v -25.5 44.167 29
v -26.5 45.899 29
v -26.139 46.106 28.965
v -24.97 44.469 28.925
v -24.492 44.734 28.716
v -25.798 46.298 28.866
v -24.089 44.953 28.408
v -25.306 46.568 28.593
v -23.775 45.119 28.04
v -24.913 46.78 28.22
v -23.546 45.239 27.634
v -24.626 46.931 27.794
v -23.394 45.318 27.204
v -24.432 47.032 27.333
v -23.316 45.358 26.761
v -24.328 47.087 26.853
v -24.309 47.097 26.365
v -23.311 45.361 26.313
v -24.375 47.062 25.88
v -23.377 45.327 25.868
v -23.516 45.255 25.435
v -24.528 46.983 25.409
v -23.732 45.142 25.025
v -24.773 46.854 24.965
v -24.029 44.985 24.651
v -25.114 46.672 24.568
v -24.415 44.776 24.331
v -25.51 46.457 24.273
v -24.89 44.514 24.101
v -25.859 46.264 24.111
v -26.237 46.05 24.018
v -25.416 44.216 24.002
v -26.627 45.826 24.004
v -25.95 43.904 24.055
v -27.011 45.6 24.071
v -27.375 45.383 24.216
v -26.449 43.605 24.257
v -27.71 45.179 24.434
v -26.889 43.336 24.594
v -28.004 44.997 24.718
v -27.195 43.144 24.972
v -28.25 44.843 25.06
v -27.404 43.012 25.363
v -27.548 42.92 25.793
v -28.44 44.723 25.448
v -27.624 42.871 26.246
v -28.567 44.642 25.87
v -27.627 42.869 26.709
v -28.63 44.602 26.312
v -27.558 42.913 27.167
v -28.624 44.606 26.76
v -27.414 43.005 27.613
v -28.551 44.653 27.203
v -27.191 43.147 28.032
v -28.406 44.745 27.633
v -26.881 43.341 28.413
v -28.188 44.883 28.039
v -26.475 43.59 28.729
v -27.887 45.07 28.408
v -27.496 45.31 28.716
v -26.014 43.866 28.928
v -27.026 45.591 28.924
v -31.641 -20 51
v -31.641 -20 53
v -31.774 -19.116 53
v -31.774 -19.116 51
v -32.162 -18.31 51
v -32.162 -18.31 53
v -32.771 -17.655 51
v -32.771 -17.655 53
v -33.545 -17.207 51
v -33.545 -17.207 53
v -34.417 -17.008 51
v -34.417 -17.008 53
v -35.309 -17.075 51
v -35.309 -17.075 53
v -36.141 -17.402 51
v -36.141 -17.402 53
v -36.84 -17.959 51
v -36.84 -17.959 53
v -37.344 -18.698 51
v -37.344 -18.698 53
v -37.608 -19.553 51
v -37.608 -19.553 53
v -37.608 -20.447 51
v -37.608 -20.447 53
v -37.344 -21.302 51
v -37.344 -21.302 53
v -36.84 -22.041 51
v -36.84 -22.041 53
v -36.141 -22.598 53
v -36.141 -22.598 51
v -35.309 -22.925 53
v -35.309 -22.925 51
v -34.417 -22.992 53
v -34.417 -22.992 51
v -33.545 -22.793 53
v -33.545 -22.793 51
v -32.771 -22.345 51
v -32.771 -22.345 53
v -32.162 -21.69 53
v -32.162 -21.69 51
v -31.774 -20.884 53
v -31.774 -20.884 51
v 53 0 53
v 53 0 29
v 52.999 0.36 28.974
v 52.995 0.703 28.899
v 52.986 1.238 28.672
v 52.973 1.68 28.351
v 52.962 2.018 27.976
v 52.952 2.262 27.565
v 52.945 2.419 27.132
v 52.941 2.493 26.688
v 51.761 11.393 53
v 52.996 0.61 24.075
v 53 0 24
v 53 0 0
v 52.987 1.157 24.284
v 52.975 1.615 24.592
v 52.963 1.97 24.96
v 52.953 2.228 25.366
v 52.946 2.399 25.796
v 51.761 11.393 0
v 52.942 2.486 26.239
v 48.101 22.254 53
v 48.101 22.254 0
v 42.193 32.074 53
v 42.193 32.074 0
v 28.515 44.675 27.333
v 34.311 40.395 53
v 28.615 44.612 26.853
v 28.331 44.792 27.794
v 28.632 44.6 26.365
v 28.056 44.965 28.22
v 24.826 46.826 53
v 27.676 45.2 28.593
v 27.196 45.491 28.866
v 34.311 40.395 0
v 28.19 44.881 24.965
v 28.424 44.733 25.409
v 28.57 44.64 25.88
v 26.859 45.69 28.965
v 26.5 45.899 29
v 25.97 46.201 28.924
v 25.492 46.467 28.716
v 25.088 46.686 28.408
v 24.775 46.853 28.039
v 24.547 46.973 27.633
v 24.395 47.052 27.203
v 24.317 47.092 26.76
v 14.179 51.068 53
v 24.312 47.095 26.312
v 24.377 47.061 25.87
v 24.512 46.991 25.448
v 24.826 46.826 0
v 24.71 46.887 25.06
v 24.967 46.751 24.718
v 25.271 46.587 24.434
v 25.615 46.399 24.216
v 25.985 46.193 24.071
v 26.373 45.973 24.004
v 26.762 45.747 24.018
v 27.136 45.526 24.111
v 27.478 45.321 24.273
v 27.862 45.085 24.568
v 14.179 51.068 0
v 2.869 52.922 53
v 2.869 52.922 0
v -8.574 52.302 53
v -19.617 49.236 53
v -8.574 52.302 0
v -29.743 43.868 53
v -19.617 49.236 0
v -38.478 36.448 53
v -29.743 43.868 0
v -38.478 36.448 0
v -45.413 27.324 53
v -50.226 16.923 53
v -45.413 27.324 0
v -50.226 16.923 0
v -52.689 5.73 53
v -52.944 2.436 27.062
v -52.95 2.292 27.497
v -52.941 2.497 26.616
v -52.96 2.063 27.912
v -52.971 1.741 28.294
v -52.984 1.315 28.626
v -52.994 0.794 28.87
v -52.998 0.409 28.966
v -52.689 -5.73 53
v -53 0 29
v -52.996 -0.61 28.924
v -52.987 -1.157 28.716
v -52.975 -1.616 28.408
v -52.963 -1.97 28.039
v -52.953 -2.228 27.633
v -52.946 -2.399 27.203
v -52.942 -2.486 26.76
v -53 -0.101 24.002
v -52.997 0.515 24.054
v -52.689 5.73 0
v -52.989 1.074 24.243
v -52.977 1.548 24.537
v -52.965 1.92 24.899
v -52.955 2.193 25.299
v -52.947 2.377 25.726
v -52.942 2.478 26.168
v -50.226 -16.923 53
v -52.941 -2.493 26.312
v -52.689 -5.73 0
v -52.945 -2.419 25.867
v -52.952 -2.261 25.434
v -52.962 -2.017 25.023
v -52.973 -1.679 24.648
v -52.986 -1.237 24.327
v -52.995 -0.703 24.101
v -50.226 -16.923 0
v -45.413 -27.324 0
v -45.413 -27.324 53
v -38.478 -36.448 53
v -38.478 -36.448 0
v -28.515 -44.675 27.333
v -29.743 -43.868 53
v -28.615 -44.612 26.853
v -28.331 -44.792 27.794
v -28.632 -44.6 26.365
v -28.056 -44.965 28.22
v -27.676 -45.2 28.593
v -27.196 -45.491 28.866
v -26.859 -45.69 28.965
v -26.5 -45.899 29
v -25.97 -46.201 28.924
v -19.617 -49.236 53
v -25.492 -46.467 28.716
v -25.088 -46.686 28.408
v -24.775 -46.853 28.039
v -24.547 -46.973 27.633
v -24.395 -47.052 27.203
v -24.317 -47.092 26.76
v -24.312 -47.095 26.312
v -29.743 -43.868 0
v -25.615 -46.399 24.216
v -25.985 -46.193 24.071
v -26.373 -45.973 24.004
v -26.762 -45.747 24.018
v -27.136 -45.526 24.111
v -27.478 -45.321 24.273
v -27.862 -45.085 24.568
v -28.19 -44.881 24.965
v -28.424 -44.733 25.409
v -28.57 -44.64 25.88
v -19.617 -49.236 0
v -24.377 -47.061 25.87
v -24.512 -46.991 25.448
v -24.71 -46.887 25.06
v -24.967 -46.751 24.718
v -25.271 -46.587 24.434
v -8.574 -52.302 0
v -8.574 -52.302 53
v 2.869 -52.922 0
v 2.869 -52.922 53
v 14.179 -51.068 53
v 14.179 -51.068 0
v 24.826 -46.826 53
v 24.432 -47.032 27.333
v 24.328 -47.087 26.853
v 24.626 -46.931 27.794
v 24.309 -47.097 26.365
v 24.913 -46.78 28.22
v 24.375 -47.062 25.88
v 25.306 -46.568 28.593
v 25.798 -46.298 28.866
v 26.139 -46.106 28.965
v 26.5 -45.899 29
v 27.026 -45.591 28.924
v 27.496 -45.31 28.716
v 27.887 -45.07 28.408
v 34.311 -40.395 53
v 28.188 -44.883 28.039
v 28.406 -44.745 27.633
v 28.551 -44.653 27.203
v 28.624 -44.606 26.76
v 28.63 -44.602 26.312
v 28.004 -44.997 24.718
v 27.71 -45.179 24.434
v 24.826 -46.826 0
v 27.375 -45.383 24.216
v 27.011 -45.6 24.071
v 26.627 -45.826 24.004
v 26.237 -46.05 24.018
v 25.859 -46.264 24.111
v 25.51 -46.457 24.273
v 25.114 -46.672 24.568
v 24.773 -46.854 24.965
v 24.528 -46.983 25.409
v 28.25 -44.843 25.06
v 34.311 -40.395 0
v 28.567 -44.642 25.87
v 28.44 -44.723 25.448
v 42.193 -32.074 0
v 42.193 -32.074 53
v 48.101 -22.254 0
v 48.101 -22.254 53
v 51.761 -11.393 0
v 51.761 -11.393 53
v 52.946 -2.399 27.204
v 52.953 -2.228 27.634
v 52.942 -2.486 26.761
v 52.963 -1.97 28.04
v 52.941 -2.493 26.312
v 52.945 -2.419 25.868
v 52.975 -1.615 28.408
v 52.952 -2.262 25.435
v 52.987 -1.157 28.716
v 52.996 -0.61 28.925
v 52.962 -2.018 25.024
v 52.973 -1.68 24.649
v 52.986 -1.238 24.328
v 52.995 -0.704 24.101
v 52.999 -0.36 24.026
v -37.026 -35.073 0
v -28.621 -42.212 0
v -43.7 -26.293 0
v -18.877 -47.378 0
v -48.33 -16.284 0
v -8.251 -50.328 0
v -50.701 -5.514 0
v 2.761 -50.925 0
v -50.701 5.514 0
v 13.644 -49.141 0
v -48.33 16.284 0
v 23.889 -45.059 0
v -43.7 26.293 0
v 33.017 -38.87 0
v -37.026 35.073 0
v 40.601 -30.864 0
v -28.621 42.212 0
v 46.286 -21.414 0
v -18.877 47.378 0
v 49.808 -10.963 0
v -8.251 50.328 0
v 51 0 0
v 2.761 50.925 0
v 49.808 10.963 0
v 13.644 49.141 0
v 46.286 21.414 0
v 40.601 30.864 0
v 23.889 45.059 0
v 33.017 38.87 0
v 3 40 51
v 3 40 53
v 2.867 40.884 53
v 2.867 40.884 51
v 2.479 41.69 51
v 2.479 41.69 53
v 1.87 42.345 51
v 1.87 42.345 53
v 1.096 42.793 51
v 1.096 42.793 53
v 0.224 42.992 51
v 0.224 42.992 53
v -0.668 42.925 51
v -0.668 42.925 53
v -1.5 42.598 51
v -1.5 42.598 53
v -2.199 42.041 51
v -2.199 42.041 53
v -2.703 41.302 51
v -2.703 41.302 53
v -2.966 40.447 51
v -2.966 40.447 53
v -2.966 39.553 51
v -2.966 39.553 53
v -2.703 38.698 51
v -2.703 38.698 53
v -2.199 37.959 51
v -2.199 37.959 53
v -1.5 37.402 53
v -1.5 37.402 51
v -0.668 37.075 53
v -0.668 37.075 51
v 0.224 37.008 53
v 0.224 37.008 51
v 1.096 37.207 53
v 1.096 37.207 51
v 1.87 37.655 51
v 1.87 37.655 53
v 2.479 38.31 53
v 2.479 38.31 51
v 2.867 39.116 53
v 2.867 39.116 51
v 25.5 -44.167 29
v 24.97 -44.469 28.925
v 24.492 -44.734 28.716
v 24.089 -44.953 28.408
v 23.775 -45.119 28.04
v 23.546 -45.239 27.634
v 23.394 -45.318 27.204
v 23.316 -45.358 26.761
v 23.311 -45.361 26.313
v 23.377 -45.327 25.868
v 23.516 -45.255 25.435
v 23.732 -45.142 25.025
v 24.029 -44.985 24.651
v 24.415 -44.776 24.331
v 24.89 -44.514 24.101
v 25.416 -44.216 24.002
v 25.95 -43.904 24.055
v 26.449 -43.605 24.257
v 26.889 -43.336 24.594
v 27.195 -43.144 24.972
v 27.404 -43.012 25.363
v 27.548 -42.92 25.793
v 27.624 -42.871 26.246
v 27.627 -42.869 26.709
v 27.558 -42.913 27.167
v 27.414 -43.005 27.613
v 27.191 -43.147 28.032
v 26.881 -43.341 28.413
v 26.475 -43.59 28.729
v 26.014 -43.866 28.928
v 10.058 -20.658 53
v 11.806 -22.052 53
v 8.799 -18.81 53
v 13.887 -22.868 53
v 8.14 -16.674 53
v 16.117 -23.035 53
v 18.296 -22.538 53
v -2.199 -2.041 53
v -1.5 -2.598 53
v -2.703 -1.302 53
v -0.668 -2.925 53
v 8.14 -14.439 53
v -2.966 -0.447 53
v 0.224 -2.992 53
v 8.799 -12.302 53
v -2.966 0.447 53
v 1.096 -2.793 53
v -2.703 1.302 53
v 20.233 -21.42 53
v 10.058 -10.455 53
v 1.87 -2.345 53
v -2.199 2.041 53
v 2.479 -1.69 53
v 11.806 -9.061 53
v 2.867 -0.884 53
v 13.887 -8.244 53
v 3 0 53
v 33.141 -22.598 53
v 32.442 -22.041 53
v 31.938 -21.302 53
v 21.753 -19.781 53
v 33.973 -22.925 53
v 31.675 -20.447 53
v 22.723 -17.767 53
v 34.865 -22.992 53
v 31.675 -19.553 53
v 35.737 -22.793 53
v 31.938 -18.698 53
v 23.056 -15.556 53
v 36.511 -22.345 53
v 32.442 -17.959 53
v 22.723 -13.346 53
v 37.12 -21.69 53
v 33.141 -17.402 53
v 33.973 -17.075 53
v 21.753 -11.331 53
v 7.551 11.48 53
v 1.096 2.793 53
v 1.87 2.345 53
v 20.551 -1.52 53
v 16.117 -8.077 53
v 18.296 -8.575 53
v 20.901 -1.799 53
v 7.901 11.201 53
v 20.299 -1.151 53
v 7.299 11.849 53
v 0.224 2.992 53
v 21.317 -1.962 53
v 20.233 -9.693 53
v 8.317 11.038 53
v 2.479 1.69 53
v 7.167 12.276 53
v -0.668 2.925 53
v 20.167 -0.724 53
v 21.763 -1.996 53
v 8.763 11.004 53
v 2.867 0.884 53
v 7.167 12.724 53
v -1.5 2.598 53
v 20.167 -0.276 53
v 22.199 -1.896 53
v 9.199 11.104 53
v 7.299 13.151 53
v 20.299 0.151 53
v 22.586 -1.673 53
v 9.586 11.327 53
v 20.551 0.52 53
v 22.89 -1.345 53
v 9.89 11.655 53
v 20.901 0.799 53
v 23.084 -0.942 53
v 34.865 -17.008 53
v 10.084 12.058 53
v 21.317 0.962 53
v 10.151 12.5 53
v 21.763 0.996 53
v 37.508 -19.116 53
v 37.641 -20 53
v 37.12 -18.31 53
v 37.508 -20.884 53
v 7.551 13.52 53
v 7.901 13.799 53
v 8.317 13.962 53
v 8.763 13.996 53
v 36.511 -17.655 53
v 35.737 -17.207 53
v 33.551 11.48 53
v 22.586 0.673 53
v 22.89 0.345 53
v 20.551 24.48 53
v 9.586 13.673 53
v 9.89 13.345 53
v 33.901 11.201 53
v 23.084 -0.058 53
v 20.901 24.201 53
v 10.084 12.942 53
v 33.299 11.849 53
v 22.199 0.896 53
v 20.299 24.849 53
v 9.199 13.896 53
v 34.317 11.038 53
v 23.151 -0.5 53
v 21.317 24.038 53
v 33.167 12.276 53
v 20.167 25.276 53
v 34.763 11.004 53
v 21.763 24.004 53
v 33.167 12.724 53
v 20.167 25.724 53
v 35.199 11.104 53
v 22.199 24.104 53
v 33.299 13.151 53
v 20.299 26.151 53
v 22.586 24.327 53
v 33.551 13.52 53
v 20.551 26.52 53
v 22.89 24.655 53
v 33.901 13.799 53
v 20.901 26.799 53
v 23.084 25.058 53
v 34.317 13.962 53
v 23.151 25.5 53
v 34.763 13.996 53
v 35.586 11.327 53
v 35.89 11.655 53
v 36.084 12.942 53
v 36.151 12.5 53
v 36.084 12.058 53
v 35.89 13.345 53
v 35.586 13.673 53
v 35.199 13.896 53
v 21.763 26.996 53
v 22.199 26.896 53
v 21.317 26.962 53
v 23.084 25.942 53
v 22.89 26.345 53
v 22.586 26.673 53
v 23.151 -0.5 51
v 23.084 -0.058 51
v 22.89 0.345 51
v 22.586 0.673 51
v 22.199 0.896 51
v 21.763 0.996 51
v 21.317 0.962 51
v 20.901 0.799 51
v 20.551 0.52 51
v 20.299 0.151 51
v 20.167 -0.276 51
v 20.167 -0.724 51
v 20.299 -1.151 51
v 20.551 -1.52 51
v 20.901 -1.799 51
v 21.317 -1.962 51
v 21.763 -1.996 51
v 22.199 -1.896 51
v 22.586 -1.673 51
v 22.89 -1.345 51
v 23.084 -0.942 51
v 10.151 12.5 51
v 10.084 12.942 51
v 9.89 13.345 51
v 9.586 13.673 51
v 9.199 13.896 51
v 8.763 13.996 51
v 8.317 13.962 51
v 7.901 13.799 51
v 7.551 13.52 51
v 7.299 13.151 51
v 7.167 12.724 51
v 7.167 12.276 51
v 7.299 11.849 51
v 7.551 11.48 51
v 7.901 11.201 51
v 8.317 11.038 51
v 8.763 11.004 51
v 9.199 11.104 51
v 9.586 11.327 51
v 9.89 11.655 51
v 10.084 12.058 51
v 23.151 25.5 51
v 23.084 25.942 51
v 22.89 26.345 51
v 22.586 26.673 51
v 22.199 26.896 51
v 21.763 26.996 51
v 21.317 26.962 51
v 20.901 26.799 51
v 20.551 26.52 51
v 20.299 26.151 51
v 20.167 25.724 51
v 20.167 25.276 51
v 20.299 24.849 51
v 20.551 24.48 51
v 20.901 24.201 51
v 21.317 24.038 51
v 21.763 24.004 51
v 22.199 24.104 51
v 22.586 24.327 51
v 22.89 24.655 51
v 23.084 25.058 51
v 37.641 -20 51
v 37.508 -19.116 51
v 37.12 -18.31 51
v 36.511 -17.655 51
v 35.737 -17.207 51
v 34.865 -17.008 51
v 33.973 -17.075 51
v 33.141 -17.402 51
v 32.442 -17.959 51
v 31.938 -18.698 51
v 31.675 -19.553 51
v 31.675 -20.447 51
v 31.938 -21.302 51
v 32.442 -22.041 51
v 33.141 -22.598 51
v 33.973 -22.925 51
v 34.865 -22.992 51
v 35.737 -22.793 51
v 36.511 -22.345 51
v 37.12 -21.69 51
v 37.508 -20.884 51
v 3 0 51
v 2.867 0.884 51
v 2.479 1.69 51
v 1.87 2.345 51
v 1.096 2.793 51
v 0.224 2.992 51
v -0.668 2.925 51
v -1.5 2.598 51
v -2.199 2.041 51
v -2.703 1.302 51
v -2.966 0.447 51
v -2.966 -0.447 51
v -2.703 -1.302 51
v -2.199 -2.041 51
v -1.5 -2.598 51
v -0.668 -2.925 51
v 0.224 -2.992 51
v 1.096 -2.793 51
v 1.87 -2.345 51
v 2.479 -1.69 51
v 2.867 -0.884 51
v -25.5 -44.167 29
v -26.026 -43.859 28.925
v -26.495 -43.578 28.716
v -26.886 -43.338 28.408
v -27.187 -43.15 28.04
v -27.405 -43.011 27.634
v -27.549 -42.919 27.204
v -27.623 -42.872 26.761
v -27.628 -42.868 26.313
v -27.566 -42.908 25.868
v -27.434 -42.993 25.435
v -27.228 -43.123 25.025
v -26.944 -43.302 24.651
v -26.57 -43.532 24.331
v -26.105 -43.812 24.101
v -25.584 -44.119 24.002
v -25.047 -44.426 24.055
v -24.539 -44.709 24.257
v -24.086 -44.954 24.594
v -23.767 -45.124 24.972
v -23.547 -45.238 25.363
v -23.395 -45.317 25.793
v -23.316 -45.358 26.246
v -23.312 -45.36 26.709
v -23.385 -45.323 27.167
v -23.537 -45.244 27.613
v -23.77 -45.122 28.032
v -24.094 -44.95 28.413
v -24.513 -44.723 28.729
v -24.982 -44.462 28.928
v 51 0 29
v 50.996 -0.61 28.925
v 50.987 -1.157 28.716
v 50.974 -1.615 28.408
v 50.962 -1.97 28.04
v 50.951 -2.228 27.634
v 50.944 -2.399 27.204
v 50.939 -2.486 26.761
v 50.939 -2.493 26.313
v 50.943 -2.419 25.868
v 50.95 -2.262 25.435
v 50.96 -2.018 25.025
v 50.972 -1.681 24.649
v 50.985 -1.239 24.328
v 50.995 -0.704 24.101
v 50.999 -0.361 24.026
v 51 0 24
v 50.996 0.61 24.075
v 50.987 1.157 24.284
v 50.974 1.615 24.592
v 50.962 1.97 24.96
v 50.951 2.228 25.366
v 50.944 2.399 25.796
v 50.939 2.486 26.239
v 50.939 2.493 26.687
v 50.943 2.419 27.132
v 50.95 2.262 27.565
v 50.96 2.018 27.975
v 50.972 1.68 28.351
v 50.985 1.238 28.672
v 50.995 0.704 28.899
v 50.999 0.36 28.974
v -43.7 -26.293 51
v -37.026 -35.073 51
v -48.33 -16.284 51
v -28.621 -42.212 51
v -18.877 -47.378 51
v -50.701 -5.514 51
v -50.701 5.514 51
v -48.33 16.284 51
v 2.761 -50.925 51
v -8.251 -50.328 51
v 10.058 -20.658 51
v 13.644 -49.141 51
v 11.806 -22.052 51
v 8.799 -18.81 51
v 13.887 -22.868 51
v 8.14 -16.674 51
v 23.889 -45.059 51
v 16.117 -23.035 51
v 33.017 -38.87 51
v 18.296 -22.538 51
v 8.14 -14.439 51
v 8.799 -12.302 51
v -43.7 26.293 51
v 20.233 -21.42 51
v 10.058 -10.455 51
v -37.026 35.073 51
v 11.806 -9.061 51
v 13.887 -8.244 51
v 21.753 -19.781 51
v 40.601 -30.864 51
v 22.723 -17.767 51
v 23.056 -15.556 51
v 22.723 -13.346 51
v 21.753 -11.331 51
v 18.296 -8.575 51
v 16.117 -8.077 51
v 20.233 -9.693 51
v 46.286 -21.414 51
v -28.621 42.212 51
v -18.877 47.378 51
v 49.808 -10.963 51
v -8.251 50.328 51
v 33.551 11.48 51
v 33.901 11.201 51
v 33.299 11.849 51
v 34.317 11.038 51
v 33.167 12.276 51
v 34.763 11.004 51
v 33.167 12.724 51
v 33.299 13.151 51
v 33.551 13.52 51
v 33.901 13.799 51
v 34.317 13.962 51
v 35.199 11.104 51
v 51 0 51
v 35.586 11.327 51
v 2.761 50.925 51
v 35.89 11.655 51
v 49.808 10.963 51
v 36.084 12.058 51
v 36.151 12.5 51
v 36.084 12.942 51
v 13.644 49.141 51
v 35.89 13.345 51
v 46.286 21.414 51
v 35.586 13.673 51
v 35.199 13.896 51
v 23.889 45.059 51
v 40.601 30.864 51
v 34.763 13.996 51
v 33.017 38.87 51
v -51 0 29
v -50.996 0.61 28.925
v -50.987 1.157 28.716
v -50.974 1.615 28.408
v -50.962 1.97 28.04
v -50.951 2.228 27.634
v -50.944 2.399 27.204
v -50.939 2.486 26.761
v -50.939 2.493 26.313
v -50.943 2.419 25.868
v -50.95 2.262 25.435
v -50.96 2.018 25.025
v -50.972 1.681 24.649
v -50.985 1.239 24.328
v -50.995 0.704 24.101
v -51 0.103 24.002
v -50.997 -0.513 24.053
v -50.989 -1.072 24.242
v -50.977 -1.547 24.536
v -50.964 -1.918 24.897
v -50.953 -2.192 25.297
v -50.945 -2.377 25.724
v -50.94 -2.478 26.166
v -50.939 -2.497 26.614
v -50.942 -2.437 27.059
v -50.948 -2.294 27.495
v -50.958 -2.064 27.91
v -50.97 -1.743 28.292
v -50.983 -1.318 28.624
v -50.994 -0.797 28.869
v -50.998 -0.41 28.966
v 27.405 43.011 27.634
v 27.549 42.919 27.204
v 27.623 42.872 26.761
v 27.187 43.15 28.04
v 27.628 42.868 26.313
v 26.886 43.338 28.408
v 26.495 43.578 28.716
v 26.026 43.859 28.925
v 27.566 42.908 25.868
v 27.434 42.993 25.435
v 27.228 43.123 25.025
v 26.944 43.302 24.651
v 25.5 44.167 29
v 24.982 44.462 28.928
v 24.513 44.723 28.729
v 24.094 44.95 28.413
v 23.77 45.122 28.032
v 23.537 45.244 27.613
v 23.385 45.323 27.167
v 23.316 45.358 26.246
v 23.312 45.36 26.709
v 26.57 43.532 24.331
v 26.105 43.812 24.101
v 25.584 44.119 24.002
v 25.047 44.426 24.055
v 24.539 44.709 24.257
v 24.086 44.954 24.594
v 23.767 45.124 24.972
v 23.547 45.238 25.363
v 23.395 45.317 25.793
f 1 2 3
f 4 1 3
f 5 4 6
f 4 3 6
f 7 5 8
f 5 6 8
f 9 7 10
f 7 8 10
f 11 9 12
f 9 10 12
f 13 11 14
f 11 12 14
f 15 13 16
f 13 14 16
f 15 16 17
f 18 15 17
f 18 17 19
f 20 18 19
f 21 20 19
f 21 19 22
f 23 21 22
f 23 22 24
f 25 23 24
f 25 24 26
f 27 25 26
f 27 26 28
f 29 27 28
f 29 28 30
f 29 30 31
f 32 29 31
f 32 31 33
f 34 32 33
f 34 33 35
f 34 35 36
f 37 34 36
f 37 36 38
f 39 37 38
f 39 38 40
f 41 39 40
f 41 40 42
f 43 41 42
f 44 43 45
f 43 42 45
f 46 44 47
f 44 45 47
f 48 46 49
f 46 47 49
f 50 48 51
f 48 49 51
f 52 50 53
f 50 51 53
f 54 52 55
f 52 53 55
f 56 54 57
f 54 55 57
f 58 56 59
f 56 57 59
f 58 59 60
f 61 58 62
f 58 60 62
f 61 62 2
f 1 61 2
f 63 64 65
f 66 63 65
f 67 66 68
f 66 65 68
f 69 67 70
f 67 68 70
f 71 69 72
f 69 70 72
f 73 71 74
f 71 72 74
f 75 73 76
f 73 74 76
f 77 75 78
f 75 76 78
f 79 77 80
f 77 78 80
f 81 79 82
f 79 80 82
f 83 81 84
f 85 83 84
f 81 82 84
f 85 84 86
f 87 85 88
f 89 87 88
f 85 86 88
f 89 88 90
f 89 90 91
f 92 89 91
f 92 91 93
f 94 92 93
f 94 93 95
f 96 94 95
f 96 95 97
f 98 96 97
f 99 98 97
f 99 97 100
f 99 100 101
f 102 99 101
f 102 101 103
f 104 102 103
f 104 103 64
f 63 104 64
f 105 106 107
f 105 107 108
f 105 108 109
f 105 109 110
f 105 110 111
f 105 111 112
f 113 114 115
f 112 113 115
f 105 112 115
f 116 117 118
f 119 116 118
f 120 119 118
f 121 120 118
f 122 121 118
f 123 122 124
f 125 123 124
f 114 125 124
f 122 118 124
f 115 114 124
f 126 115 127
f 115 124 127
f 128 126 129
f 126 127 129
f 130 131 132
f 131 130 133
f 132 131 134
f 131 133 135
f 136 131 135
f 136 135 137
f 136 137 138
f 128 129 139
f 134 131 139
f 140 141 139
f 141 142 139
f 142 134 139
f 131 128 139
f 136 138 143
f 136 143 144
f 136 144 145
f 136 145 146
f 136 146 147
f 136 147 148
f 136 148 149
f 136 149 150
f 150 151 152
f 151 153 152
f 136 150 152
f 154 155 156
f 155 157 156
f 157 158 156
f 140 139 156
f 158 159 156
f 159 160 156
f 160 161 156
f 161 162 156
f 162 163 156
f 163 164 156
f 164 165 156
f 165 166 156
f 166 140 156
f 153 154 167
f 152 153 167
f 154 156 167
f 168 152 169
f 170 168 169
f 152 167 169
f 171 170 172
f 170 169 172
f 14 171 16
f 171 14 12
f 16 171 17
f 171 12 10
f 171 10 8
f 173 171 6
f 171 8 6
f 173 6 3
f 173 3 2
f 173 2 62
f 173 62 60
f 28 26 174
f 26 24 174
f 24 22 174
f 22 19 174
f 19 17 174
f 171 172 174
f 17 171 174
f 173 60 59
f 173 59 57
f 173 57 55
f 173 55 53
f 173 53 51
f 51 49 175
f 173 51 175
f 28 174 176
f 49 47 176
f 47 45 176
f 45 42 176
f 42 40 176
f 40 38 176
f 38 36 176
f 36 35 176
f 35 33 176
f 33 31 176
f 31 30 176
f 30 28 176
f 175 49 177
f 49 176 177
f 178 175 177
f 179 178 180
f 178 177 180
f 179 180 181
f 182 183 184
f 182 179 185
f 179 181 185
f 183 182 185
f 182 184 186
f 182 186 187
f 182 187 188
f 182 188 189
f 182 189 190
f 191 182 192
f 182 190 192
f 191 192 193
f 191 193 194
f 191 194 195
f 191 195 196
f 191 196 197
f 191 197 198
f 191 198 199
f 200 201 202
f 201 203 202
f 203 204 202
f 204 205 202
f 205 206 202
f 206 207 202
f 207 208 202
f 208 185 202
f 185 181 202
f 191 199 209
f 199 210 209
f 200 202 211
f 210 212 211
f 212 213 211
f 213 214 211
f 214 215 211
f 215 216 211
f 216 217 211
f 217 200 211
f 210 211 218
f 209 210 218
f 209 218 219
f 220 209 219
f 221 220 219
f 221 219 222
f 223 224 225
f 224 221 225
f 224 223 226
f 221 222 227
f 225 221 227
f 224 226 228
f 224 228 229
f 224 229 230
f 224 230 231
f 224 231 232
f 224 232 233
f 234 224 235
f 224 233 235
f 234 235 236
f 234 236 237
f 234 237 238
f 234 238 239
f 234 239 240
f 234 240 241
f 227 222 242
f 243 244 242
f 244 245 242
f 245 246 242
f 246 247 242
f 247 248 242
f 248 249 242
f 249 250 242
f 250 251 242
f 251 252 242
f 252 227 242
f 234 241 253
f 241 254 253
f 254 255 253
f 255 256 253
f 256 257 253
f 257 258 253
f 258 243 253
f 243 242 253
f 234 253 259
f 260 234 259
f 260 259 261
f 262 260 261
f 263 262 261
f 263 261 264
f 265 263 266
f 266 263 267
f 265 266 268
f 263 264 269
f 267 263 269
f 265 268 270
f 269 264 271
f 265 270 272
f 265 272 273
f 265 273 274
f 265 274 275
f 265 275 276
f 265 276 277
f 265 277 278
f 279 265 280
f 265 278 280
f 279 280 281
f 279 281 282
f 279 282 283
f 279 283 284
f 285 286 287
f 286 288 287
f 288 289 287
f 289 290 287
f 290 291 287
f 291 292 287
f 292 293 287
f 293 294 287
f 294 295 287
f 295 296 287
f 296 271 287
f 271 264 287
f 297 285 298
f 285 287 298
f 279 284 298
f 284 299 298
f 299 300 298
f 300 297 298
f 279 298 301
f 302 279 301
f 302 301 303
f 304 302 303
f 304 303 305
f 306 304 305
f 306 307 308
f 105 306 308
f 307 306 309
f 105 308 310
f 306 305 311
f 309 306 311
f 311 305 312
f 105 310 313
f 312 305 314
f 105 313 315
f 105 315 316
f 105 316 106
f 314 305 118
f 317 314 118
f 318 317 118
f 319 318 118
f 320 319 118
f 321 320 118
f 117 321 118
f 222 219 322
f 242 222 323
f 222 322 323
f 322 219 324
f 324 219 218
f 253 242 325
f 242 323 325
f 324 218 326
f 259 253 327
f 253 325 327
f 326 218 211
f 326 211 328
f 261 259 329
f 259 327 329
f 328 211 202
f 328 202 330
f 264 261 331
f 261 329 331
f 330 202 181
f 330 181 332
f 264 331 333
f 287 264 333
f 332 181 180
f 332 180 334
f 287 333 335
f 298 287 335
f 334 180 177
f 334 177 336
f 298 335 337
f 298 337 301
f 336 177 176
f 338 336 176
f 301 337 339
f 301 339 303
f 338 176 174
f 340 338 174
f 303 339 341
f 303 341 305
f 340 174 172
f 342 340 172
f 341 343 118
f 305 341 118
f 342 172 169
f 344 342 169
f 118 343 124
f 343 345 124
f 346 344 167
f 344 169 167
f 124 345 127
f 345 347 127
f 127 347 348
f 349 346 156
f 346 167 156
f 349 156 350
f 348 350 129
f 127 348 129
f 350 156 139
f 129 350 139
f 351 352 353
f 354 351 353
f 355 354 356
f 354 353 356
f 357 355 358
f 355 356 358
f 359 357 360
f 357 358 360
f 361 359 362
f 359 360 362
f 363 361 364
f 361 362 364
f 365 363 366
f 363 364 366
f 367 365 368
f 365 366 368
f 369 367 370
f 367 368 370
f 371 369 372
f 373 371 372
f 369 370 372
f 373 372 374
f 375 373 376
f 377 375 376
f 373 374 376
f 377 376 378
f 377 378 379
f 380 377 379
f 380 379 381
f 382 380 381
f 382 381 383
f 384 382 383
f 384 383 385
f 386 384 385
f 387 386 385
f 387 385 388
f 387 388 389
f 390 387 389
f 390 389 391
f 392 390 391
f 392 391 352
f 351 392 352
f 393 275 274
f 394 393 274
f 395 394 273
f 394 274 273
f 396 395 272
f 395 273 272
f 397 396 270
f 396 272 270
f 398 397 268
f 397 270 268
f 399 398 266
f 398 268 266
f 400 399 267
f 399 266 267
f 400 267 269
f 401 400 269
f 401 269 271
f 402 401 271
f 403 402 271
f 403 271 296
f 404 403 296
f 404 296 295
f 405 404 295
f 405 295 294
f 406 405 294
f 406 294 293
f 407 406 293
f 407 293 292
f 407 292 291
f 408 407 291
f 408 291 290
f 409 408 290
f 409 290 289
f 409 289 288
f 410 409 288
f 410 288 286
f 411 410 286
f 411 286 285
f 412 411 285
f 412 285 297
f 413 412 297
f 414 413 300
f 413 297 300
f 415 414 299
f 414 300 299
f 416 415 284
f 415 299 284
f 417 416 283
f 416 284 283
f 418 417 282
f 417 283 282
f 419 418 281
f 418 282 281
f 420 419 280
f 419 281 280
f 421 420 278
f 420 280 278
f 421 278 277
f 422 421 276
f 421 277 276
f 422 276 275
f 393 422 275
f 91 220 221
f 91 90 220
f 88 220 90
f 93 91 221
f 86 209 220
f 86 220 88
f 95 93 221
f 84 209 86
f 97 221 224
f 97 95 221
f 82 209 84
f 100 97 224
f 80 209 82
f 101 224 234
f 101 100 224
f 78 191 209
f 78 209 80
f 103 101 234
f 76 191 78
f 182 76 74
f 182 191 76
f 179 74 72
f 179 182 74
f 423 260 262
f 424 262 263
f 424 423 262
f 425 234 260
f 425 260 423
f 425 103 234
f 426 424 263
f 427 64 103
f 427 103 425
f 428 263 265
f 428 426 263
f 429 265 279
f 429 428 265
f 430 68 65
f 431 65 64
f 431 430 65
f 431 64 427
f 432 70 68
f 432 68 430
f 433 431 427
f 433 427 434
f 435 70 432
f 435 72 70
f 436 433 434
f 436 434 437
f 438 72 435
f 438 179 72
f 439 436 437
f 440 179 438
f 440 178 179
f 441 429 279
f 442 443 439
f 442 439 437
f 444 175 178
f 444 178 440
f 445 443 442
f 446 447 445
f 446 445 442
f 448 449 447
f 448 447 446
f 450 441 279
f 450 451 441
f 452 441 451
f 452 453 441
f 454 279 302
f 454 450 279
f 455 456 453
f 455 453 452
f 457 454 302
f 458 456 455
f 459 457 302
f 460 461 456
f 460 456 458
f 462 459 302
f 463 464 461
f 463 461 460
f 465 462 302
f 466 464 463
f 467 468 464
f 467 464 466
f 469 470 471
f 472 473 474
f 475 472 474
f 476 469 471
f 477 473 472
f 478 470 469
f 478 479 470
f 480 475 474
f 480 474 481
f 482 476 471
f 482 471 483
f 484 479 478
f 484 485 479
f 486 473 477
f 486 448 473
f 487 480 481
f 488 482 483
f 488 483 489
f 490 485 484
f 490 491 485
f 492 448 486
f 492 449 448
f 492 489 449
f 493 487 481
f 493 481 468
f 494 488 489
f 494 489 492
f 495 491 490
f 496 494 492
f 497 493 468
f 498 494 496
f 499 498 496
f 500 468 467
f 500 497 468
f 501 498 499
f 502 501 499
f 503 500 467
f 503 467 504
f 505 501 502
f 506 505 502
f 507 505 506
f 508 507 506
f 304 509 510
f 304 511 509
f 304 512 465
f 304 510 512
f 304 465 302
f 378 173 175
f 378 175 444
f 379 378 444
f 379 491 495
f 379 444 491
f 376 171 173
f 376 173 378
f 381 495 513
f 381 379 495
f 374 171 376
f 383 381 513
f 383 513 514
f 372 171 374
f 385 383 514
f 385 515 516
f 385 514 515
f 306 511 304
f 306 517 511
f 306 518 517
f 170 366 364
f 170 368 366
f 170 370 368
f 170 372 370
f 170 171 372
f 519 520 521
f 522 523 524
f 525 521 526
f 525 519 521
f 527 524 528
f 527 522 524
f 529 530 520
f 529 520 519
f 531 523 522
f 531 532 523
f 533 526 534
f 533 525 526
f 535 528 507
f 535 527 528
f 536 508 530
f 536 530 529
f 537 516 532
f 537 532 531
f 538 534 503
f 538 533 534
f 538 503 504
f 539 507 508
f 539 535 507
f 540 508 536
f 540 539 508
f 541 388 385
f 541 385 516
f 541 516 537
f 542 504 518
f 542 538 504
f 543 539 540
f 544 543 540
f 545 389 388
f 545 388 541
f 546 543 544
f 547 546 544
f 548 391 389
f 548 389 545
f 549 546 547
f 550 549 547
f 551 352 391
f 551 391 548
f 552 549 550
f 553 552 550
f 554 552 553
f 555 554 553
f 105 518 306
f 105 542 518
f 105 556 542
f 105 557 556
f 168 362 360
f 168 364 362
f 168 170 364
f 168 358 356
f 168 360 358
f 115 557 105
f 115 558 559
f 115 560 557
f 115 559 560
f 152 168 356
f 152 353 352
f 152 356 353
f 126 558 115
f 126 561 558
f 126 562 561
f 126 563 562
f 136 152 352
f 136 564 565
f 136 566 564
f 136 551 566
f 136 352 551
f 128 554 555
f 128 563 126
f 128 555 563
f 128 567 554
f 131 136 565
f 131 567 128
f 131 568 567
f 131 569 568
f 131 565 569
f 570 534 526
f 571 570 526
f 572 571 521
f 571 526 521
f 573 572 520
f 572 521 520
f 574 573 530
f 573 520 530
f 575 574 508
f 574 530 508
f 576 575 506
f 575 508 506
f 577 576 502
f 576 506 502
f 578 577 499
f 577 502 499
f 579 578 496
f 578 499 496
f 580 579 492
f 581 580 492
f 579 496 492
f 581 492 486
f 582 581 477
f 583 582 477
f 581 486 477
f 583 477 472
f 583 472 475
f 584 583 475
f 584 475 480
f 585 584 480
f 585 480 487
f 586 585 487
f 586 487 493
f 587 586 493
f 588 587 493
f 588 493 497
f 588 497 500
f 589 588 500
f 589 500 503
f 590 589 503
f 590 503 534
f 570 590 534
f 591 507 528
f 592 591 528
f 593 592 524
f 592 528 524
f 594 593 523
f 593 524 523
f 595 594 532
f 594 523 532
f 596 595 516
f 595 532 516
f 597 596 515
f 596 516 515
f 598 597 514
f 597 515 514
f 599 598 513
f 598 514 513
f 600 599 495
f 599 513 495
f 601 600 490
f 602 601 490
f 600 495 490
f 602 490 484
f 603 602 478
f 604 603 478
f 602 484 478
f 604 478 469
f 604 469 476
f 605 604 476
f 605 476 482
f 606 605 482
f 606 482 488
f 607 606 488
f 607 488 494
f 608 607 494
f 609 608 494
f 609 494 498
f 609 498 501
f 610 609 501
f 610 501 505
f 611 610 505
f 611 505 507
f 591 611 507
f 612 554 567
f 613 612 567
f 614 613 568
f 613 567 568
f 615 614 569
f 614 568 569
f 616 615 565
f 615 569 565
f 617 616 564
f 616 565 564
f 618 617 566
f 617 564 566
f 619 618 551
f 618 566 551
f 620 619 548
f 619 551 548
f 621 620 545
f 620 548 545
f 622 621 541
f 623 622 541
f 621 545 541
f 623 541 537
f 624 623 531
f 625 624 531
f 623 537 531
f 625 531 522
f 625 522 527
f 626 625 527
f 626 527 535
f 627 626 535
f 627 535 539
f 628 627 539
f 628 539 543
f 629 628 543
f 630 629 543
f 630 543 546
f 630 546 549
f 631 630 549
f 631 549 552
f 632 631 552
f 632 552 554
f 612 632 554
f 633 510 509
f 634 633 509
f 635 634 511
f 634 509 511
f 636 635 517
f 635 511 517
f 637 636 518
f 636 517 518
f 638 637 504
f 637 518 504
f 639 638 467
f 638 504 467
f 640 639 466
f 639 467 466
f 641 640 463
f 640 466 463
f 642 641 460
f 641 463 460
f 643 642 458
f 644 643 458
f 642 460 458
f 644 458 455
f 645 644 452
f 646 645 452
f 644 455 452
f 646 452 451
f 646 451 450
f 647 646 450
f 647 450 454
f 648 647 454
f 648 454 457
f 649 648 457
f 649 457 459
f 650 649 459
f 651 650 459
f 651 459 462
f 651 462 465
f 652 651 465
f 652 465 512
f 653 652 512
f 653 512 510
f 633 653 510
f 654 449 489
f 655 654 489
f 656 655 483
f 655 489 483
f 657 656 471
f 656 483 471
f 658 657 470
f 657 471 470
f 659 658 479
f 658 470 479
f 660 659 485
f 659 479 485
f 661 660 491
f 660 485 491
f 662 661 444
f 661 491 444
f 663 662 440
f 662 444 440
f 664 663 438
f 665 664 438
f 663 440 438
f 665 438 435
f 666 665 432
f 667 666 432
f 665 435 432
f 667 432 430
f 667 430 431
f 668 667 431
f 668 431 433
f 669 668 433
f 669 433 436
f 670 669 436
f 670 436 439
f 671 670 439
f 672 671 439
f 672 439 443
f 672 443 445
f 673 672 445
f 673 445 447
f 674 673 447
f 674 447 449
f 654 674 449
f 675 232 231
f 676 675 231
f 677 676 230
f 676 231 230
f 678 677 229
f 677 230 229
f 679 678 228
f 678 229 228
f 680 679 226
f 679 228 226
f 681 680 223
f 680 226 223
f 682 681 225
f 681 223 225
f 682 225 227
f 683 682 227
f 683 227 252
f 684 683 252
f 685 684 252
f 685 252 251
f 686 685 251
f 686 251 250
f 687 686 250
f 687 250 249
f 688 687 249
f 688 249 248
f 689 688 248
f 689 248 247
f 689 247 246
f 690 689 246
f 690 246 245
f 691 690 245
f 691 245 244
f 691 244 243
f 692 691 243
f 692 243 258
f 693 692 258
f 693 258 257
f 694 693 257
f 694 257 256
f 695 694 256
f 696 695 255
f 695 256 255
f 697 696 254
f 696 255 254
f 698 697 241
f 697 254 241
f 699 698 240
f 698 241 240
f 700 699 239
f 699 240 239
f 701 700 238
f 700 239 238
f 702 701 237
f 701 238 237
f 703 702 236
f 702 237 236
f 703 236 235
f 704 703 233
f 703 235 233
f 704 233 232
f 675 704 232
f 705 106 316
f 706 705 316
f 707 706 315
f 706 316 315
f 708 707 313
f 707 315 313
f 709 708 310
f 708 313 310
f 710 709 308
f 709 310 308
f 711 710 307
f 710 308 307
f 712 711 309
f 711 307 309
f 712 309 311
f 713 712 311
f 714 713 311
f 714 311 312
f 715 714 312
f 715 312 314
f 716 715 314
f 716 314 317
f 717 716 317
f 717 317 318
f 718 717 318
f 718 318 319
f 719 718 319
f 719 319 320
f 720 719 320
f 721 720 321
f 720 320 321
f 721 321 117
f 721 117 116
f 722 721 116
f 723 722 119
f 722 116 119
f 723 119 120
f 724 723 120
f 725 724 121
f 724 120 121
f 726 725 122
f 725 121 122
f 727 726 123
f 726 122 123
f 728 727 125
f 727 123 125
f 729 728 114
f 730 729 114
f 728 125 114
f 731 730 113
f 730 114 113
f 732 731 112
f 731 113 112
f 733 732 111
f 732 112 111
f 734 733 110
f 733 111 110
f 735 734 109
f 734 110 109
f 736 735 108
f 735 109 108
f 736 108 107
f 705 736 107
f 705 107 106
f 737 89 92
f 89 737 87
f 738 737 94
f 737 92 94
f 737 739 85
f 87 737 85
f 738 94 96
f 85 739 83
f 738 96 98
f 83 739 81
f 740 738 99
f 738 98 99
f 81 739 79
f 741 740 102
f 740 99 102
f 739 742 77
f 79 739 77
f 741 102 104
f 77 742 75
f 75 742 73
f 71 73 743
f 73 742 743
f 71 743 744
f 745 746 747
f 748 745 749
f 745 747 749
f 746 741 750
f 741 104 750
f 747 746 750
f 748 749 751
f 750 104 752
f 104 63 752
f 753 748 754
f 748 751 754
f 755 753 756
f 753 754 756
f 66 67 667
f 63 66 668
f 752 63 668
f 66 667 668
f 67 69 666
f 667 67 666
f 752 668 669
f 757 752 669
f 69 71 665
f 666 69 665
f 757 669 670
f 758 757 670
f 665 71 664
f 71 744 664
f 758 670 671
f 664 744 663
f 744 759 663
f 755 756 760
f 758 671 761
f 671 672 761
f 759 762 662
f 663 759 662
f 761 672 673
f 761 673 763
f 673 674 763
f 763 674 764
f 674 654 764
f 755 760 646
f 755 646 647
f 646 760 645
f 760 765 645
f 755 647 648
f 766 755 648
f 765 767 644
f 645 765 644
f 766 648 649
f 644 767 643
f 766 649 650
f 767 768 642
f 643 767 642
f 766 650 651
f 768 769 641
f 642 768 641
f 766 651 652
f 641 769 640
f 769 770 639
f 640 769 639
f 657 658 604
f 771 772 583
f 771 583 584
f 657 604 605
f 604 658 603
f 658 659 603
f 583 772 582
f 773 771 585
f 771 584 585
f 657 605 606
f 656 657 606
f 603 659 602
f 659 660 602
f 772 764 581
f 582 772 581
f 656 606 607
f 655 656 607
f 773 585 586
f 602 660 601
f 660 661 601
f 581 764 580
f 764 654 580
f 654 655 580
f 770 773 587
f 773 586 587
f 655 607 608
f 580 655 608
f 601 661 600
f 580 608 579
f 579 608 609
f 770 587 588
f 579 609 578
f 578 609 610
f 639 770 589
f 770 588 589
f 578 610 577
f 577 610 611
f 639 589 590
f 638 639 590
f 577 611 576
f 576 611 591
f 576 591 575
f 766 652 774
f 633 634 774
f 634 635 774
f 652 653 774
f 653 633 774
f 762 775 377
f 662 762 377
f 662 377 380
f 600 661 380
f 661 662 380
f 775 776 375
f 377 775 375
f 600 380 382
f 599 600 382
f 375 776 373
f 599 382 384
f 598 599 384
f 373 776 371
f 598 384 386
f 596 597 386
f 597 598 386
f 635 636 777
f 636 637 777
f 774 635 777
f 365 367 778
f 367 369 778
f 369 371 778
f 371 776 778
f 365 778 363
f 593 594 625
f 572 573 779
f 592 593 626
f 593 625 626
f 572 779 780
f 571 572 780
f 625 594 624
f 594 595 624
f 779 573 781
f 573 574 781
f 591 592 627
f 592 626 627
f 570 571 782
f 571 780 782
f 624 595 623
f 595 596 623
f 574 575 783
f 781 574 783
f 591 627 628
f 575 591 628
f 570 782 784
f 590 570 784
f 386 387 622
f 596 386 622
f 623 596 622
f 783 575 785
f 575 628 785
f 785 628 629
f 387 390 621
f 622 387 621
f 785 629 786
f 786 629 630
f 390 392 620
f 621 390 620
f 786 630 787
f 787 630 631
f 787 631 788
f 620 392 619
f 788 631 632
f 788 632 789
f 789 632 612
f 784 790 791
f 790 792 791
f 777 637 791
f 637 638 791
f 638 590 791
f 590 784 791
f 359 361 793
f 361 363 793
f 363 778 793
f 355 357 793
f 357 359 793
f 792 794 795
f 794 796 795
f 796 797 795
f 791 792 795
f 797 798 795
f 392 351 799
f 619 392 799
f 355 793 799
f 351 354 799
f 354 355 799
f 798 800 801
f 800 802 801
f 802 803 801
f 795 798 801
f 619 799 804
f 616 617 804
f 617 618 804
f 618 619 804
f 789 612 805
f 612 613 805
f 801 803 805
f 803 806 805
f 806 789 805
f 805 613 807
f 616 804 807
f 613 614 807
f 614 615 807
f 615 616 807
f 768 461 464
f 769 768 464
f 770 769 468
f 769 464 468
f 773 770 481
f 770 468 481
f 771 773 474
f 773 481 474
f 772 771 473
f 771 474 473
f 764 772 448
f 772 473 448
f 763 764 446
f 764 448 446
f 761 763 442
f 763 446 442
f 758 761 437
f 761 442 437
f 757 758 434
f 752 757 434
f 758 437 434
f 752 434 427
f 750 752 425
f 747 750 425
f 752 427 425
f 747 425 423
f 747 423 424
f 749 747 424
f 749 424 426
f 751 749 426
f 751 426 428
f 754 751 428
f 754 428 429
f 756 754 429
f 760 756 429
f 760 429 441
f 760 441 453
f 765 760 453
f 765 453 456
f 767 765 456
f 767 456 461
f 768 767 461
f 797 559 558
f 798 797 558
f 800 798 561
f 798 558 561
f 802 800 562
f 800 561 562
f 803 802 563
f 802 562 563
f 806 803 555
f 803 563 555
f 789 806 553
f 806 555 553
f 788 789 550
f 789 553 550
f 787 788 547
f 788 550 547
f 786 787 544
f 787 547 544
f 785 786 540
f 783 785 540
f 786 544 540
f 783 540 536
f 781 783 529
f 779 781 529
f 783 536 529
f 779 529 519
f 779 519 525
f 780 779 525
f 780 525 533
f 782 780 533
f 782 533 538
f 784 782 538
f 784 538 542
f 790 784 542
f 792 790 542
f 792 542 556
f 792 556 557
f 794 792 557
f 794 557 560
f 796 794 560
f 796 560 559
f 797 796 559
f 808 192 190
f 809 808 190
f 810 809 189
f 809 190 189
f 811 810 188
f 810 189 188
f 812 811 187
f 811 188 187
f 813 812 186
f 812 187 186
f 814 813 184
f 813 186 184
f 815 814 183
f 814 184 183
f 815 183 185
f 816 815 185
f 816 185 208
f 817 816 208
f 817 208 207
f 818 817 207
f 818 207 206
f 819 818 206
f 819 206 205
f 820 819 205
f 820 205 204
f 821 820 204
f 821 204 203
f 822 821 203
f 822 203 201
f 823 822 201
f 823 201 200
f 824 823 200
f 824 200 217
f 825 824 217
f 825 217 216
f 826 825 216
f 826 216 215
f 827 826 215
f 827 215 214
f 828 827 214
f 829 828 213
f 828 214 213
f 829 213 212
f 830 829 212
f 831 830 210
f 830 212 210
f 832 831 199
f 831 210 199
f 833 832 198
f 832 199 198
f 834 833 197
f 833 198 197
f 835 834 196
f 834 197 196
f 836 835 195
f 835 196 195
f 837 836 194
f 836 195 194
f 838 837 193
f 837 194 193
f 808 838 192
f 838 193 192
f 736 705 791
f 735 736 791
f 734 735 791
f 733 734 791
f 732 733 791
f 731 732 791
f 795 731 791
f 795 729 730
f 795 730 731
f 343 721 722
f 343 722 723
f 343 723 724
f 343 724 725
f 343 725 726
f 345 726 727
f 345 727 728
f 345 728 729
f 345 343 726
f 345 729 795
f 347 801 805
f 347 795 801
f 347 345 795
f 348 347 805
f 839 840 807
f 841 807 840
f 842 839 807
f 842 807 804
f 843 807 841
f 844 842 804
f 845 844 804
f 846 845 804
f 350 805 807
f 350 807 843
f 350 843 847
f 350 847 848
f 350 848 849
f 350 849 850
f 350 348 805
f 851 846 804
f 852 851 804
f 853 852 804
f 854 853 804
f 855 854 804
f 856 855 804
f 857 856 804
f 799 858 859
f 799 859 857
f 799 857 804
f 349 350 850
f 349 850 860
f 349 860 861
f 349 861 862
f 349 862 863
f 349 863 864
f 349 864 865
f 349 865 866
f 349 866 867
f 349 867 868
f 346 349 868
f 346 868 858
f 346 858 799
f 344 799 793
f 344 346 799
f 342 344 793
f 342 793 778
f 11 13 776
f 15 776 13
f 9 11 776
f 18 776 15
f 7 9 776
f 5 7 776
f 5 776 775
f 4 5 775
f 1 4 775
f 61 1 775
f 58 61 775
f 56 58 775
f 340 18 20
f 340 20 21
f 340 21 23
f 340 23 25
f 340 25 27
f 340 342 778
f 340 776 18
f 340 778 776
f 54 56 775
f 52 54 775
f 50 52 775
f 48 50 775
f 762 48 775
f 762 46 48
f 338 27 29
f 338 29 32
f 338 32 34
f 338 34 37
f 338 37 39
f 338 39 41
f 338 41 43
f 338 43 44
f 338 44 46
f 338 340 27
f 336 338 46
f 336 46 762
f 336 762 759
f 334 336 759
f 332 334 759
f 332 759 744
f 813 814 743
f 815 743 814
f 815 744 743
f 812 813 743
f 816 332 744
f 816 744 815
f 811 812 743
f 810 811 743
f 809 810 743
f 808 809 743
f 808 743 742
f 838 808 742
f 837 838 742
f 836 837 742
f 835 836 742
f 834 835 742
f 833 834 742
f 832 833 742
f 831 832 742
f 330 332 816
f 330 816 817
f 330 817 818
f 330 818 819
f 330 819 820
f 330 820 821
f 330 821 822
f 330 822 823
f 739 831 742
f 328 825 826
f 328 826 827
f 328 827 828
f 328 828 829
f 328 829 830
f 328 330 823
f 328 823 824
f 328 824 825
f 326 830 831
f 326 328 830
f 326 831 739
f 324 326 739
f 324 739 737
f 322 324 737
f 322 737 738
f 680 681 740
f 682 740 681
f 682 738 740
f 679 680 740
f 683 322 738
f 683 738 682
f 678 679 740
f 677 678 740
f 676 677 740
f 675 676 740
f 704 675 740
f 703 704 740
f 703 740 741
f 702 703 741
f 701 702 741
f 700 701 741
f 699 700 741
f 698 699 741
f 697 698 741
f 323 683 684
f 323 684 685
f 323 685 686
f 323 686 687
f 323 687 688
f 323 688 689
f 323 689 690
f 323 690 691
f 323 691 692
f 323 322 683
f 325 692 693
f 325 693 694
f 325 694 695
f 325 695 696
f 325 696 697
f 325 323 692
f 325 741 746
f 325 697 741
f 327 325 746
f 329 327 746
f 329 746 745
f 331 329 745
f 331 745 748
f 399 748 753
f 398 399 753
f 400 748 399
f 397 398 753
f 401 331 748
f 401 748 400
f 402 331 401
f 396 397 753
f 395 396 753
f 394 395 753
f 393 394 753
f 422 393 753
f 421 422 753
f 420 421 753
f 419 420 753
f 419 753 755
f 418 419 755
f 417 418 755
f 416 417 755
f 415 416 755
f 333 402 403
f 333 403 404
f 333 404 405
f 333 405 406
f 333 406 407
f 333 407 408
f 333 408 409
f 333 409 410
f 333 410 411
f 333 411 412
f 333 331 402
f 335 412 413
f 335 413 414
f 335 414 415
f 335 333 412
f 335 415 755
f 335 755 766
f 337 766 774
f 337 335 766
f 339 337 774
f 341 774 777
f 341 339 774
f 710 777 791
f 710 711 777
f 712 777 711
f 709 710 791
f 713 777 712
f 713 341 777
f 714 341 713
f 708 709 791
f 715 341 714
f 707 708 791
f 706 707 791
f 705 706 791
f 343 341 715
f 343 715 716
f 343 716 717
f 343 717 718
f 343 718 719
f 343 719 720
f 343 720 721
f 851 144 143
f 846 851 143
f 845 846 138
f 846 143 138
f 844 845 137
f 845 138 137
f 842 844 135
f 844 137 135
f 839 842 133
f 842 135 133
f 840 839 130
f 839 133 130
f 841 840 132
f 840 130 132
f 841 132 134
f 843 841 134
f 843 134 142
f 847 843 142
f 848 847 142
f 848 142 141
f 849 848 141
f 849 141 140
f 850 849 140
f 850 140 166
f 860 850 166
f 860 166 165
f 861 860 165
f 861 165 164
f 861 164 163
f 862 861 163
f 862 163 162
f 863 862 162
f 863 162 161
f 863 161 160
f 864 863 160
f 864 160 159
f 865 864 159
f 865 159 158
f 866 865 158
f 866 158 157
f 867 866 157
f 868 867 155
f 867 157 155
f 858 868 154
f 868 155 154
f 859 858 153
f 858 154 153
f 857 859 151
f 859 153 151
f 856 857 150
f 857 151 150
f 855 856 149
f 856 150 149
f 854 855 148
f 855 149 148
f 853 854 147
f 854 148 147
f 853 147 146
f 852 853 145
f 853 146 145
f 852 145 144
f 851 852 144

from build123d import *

# Parameters (mm, degrees)
SKETCH1_R           = 53
BOSS_EXTRUDE1_DEPTH = 53
SKETCH2_R           = 3
CUT_EXTRUDE1_DEPTH  = 92.798692801
SHELL4_T            = -2
SKETCH6_R           = 1.5
CUT_EXTRUDE3_DEPTH  = 10
SKETCH7_R           = 7.5
CUT_EXTRUDE4_DEPTH  = 10
SKETCH8_R           = 51
CUT_EXTRUDE5_DEPTH  = 51
SKETCH9_R           = 2.5
CUT_EXTRUDE6_DEPTH  = 51
CIRPATTERN1_COUNT   = 6


with BuildPart() as part:
    # Sketch1 → Boss-Extrude1 (new body)
    with BuildSketch(Plane.XY):
        Circle(SKETCH1_R)
    extrude(amount=BOSS_EXTRUDE1_DEPTH)

    # Sketch2 → Cut-Extrude1 (cut, through all)
    with BuildSketch(Plane.XY.offset(53)):
        with Locations((0, 40)):
            Circle(SKETCH2_R)
        with Locations((34.641016151, -20)):
            Circle(SKETCH2_R)
        with Locations((-34.641016151, -20)):
            Circle(SKETCH2_R)
        Circle(SKETCH2_R)
    extrude(amount=-CUT_EXTRUDE1_DEPTH, mode=Mode.SUBTRACT)

    # Shell4
    shell4_openings = [part.faces().sort_by_distance(p)[0] for p in [
        (-51.500933624, 0, 0),
    ]]
    offset(amount=SHELL4_T, openings=shell4_openings, kind=Kind.INTERSECTION)

    # Sketch6 → Cut-Extrude3 (cut)
    with BuildSketch(Plane.XY.offset(53)):
        with Locations((21.650635095, 25.5)):
            Circle(SKETCH6_R)
        with Locations((34.650635095, 12.5)):
            Circle(SKETCH6_R)
        with Locations((21.650635095, -0.5)):
            Circle(SKETCH6_R)
        with Locations((8.650635095, 12.5)):
            Circle(SKETCH6_R)
    extrude(amount=-CUT_EXTRUDE3_DEPTH, mode=Mode.SUBTRACT)

    # Sketch7 → Cut-Extrude4 (cut)
    with BuildSketch(Plane.XY.offset(53)):
        with Locations((15.556349186, -15.556349186)):
            Circle(SKETCH7_R)
    extrude(amount=-CUT_EXTRUDE4_DEPTH, mode=Mode.SUBTRACT)

    # Sketch8 → Cut-Extrude5 (cut)
    with BuildSketch(Plane(origin=(0, 0, 0), x_dir=(-1, 0, 0), z_dir=(0, 0, -1))):
        with Locations(Location((0, 0, 0), (0, 0, 180))):
            Circle(SKETCH8_R)
    extrude(amount=-CUT_EXTRUDE5_DEPTH, mode=Mode.SUBTRACT)

    # Sketch9 → Cut-Extrude6 (cut)
    with BuildSketch(Plane.ZY.offset(53)):
        with Locations((26.5, 0)):
            Circle(SKETCH9_R)
    cut_extrude6 = extrude(amount=-CUT_EXTRUDE6_DEPTH, mode=Mode.SUBTRACT)

    # CirPattern1: Cut-Extrude6 ×6 about axis
    cirpattern1_axis = Axis((0, 0, 0), (0, 0, 1))
    for i in range(1, CIRPATTERN1_COUNT):
        add(cut_extrude6.rotate(cirpattern1_axis, i * 360 / CIRPATTERN1_COUNT), mode=Mode.SUBTRACT)


solid = part.part
